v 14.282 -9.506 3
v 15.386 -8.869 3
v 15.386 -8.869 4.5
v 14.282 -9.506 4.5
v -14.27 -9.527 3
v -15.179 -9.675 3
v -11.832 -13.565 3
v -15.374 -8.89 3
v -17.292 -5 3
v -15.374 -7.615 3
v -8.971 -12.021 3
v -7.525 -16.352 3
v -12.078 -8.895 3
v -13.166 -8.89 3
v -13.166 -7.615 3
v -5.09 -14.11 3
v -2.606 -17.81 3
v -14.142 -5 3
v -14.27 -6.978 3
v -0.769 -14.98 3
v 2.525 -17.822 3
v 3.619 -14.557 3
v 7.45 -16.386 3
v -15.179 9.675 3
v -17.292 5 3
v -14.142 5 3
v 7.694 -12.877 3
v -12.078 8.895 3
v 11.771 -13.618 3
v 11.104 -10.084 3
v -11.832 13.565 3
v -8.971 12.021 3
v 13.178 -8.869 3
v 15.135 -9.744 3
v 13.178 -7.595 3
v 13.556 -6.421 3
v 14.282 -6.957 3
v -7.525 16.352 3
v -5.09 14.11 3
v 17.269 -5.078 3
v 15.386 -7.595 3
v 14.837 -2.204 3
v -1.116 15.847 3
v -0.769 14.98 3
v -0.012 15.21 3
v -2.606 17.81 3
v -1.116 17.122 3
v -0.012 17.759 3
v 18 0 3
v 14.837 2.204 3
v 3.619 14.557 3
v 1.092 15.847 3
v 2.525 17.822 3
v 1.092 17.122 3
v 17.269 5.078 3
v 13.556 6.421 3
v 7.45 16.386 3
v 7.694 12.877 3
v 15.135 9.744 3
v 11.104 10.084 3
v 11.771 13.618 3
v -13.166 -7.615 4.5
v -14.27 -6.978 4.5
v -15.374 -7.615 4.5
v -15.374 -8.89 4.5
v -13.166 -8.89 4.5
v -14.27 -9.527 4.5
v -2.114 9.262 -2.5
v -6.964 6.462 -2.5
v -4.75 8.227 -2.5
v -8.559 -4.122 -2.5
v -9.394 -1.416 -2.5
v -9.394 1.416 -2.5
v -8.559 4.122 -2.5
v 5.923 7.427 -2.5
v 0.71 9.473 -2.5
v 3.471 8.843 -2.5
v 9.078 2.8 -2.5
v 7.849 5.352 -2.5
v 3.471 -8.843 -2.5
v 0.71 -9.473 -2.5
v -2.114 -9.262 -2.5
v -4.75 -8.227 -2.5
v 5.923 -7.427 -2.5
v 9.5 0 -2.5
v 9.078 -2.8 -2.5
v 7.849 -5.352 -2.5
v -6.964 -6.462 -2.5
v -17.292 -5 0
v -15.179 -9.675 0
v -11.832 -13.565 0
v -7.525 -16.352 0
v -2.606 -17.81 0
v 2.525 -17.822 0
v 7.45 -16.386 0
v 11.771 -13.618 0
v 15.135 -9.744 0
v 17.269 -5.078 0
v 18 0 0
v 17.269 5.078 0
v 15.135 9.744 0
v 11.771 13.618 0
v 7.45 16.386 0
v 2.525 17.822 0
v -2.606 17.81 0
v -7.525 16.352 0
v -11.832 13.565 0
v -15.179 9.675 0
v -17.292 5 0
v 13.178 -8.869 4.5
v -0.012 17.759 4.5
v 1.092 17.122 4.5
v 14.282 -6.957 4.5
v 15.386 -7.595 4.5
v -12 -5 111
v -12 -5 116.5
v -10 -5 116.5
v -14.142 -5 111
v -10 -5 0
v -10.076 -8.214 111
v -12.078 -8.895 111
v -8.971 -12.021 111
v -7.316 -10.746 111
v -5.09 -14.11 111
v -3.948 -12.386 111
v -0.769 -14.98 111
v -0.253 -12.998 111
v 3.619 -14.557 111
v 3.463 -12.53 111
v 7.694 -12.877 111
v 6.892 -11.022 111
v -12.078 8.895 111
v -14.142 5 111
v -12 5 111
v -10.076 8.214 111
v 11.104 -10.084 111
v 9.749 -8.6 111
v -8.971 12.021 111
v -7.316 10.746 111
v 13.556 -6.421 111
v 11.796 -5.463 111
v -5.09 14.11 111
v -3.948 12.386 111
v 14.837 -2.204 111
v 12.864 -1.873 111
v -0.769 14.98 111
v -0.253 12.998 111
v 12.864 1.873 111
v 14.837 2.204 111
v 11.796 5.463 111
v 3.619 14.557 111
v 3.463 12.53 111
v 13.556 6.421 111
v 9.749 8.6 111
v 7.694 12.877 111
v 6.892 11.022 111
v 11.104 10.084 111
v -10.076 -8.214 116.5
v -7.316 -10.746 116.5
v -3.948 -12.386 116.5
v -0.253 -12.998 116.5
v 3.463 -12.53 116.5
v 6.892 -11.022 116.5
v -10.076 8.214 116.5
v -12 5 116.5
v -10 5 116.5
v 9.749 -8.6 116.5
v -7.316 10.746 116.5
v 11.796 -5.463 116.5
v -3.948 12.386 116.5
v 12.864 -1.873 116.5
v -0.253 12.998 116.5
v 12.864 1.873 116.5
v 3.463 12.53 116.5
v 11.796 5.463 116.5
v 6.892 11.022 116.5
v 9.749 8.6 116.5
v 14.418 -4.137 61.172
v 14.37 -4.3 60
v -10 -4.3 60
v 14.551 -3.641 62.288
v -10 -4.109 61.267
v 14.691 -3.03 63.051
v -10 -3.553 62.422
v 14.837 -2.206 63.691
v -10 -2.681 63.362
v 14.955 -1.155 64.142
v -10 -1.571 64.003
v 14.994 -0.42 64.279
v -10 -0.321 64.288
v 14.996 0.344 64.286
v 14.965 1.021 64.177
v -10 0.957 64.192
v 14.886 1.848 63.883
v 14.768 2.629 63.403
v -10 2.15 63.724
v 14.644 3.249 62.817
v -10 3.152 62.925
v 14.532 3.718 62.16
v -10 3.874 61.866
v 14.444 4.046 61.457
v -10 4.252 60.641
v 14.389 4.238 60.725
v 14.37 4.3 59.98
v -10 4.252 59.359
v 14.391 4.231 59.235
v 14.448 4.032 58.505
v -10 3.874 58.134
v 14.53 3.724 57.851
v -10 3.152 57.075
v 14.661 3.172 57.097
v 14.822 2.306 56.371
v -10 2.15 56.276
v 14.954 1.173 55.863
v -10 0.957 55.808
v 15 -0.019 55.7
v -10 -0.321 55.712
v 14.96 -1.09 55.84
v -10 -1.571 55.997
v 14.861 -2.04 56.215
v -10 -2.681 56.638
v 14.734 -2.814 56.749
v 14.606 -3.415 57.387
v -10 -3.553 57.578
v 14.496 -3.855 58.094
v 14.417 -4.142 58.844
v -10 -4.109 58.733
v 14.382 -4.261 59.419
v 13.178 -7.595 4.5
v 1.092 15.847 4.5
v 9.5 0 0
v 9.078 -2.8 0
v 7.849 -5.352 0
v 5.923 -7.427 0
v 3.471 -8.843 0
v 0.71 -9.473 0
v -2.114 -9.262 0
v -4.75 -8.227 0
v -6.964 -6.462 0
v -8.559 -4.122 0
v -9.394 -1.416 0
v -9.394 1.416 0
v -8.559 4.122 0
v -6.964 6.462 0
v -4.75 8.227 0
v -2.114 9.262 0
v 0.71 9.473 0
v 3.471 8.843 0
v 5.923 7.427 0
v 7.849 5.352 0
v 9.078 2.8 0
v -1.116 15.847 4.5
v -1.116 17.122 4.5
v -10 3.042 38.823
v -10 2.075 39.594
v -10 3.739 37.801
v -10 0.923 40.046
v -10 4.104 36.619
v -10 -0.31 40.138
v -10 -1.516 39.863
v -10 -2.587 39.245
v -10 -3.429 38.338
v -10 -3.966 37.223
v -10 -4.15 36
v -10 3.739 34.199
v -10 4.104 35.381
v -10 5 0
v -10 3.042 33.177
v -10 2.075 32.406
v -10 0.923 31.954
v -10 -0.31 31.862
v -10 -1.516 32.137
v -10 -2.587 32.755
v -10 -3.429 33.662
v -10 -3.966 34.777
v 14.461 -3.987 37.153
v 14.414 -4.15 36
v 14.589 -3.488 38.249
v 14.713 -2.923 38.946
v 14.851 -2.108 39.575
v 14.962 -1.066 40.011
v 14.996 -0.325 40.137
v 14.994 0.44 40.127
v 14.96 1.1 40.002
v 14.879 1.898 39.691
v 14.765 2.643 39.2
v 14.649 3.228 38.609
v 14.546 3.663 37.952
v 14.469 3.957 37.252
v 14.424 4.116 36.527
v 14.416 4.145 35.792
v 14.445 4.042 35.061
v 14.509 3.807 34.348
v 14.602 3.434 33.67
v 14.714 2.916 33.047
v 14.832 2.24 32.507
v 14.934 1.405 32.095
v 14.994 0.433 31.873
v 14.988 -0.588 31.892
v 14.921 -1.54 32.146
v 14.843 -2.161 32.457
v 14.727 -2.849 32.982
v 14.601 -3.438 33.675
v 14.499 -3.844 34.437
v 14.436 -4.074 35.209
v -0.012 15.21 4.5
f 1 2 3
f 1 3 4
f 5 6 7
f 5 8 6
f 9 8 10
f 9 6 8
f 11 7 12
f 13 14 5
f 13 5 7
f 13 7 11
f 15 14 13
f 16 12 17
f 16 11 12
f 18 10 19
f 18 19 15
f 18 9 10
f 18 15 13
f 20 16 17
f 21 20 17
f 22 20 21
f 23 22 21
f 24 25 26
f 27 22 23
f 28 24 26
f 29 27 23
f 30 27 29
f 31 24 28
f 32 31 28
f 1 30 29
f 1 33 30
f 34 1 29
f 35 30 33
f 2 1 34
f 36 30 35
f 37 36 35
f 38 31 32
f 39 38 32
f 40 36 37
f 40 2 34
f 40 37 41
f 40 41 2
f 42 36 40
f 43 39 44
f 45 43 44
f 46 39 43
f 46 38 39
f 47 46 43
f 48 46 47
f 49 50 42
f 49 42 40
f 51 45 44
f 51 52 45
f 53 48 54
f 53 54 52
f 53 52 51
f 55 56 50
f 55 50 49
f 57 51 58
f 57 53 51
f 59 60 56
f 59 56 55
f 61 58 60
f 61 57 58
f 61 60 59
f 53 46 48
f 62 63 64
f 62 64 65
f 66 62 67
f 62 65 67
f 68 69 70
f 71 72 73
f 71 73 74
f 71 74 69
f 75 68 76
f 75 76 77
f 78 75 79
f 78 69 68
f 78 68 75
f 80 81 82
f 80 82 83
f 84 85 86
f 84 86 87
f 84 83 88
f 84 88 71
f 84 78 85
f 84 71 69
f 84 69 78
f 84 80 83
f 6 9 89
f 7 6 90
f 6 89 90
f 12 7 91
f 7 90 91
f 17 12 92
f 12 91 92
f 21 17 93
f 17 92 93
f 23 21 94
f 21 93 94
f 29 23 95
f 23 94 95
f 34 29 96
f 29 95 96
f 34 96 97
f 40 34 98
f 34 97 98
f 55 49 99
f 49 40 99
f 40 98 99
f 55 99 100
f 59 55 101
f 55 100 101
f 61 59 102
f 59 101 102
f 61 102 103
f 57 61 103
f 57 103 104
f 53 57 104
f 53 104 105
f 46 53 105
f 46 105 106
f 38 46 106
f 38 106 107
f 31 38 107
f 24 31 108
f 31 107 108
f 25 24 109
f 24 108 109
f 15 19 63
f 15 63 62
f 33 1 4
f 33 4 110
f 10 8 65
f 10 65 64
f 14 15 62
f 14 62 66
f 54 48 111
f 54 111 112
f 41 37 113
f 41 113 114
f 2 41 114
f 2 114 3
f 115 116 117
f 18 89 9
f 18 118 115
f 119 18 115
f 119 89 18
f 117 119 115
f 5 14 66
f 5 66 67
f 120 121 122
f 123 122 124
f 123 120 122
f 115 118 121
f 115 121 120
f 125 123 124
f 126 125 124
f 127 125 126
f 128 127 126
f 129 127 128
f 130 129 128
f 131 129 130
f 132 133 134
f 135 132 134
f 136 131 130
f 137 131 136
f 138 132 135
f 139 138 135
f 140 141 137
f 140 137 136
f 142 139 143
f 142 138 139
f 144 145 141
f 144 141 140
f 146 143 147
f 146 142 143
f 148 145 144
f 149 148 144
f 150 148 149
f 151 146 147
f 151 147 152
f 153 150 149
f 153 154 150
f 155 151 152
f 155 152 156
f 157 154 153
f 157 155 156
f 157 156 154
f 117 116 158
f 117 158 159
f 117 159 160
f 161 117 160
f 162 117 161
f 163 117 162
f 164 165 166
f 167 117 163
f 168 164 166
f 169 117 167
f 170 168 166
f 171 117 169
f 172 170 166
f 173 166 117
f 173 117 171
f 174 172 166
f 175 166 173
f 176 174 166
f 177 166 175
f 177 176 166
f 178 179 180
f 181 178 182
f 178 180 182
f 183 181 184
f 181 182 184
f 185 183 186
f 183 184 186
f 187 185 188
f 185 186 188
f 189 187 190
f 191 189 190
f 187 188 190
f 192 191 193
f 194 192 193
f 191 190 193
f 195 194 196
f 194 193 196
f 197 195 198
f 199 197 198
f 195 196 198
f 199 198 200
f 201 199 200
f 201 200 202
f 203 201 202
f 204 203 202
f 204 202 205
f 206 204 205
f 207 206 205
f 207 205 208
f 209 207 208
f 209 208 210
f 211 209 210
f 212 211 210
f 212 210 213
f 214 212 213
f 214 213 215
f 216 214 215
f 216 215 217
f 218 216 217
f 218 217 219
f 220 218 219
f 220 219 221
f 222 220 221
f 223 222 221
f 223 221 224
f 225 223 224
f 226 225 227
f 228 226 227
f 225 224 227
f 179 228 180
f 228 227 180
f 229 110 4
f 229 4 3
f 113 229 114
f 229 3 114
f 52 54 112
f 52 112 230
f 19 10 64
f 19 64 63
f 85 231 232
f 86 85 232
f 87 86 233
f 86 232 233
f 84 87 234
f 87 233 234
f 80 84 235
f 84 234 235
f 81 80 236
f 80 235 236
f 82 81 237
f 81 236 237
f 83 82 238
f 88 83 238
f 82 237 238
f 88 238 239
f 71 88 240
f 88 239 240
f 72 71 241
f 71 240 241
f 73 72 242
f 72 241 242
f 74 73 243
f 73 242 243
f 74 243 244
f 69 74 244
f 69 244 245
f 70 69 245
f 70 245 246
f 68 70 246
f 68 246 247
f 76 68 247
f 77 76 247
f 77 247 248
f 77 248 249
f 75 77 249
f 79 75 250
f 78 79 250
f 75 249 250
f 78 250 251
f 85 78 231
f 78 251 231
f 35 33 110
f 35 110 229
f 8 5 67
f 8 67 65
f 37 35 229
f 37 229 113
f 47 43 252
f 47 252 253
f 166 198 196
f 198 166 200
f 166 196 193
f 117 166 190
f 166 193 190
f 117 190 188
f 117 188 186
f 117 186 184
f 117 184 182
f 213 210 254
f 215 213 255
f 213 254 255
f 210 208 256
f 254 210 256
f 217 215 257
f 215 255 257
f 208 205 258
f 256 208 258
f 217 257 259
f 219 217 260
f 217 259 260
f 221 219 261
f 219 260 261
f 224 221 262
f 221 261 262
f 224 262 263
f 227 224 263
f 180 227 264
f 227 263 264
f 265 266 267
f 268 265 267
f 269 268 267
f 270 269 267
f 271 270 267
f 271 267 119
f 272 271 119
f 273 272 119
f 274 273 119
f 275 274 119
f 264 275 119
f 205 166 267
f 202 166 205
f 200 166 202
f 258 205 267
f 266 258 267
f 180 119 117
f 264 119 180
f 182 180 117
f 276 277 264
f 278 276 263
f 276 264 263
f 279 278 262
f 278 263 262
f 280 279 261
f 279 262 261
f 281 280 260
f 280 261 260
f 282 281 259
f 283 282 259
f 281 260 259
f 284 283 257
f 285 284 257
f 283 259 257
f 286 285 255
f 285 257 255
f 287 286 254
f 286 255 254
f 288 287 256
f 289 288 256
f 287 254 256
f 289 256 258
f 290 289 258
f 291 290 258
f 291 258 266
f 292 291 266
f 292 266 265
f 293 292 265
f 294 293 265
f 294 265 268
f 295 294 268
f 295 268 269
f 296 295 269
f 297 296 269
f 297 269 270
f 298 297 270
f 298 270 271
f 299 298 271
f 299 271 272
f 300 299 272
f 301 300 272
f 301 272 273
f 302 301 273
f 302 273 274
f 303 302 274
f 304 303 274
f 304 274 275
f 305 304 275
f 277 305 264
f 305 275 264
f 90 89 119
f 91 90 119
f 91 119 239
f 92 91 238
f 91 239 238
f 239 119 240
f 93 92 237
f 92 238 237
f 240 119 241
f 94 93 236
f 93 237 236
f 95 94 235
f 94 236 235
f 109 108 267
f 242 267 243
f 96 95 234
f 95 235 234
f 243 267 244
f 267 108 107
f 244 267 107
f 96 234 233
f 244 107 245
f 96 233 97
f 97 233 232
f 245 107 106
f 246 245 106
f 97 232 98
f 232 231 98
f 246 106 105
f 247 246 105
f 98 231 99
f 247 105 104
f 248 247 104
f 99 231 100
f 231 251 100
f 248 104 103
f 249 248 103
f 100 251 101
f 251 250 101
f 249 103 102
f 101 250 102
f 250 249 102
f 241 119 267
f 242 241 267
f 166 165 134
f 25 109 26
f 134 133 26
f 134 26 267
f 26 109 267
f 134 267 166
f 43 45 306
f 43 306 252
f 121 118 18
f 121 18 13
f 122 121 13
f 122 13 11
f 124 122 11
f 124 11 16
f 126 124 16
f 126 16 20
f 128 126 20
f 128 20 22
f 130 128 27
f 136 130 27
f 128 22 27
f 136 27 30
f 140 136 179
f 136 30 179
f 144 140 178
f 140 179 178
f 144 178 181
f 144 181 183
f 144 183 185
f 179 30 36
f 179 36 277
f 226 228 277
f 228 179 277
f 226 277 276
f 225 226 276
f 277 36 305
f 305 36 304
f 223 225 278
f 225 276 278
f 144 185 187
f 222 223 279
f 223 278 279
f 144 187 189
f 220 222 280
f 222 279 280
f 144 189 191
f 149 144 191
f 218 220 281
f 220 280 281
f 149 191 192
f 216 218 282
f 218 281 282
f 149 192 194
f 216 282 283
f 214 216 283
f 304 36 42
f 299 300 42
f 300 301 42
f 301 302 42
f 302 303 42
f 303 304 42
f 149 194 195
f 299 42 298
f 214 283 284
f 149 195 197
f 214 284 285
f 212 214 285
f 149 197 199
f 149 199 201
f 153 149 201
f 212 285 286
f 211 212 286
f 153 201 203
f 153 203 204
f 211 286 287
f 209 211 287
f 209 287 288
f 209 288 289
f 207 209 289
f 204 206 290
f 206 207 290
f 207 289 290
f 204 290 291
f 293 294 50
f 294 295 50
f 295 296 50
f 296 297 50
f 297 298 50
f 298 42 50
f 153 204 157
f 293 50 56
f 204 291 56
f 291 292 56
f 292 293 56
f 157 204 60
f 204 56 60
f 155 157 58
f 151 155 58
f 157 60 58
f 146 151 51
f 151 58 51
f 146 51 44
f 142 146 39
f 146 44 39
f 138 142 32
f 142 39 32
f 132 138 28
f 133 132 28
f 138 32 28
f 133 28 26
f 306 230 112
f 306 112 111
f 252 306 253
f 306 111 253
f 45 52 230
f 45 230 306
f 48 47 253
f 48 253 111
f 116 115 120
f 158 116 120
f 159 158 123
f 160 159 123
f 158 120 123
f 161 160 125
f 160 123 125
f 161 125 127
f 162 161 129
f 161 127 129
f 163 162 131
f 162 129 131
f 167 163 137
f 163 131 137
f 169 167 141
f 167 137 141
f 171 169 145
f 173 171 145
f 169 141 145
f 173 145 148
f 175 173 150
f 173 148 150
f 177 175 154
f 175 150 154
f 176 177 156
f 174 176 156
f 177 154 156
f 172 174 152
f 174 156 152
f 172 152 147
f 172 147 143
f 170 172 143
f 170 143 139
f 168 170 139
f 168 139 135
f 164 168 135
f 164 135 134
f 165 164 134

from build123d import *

# Parameters (mm, degrees)
SKETCH_R           = 18
PAD_DEPTH          = 3
SKETCH001_R        = 15
PAD001_DEPTH       = 108
SKETCH002_R        = 9.5
PAD002_DEPTH       = 2.5
SKETCH003_R        = 13
PAD003_DEPTH       = 5.5
PAD004_DEPTH       = 1.5
POLARPATTERN_COUNT = 3
SKETCH009_W        = 8
SKETCH009_H        = 10
POCKET_DEPTH       = 118
SKETCH010_R        = 4.15
POCKET001_DEPTH    = 25
SKETCH011_R        = 4.3
POCKET002_DEPTH    = 25


with BuildPart() as part:
    # Sketch → Pad (new body)
    with BuildSketch(Plane.XY):
        Circle(SKETCH_R)
    extrude(amount=PAD_DEPTH)

    # Sketch001 (on Face3 of Pad) → Pad001 (join)
    with BuildSketch(Plane.XY.offset(3)):
        Circle(SKETCH001_R)
    extrude(amount=PAD001_DEPTH)

    # Sketch002 (on Face2 of Pad001) → Pad002 (join)
    with BuildSketch(Plane(origin=(0, 0, 0), x_dir=(1, 0, 0), z_dir=(0, 0, -1))):
        Circle(SKETCH002_R)
    extrude(amount=PAD002_DEPTH)

    # Sketch003 (on Face7 of Pad002) → Pad003 (join)
    with BuildSketch(Plane.XY.offset(111)):
        Circle(SKETCH003_R)
    extrude(amount=PAD003_DEPTH)

    # Sketch008 (on Face3 of Pad003) → Pad004 (join)
    with BuildSketch(Plane.XY.offset(3)):
        Polygon((-1.11579, 17.121659), (-0.012041, 17.758909), (1.091708, 17.121659), (1.091708, 15.84716), (-0.012041, 15.209911), (-1.11579, 15.84716), align=None)
    pad004 = extrude(amount=PAD004_DEPTH)

    # PolarPattern: Pad004 ×3 about axis
    polarpattern_axis = Axis((0, 0, 3), (0, 0, 1))
    for i in range(1, POLARPATTERN_COUNT):
        add(pad004.rotate(polarpattern_axis, i * 360 / POLARPATTERN_COUNT))

    # Sketch009 (on Face2 of PolarPattern) → Pocket (cut)
    with BuildSketch(Plane(origin=(0, 0, 0), x_dir=(1, 0, 0), z_dir=(0, 0, -1))):
        with Locations((-14, 0)):
            Rectangle(SKETCH009_W, SKETCH009_H)
    extrude(amount=-POCKET_DEPTH, mode=Mode.SUBTRACT)

    # Sketch010 (on Face7 of Pocket) → Pocket001 (cut)
    with BuildSketch(Plane(origin=(-10, 0, 0), x_dir=(0, -1, 0), z_dir=(-1, 0, 0))):
        with Locations((0, 36)):
            Circle(SKETCH010_R)
    extrude(amount=-POCKET001_DEPTH, mode=Mode.SUBTRACT)

    # Sketch011 → Pocket002 (cut)
    with BuildSketch(Plane(origin=(-10, 0, 0), x_dir=(0, -1, 0), z_dir=(-1, 0, 0))):
        with Locations((0, 60)):
            Circle(SKETCH011_R)
    extrude(amount=-POCKET002_DEPTH, mode=Mode.SUBTRACT)


solid = part.part
